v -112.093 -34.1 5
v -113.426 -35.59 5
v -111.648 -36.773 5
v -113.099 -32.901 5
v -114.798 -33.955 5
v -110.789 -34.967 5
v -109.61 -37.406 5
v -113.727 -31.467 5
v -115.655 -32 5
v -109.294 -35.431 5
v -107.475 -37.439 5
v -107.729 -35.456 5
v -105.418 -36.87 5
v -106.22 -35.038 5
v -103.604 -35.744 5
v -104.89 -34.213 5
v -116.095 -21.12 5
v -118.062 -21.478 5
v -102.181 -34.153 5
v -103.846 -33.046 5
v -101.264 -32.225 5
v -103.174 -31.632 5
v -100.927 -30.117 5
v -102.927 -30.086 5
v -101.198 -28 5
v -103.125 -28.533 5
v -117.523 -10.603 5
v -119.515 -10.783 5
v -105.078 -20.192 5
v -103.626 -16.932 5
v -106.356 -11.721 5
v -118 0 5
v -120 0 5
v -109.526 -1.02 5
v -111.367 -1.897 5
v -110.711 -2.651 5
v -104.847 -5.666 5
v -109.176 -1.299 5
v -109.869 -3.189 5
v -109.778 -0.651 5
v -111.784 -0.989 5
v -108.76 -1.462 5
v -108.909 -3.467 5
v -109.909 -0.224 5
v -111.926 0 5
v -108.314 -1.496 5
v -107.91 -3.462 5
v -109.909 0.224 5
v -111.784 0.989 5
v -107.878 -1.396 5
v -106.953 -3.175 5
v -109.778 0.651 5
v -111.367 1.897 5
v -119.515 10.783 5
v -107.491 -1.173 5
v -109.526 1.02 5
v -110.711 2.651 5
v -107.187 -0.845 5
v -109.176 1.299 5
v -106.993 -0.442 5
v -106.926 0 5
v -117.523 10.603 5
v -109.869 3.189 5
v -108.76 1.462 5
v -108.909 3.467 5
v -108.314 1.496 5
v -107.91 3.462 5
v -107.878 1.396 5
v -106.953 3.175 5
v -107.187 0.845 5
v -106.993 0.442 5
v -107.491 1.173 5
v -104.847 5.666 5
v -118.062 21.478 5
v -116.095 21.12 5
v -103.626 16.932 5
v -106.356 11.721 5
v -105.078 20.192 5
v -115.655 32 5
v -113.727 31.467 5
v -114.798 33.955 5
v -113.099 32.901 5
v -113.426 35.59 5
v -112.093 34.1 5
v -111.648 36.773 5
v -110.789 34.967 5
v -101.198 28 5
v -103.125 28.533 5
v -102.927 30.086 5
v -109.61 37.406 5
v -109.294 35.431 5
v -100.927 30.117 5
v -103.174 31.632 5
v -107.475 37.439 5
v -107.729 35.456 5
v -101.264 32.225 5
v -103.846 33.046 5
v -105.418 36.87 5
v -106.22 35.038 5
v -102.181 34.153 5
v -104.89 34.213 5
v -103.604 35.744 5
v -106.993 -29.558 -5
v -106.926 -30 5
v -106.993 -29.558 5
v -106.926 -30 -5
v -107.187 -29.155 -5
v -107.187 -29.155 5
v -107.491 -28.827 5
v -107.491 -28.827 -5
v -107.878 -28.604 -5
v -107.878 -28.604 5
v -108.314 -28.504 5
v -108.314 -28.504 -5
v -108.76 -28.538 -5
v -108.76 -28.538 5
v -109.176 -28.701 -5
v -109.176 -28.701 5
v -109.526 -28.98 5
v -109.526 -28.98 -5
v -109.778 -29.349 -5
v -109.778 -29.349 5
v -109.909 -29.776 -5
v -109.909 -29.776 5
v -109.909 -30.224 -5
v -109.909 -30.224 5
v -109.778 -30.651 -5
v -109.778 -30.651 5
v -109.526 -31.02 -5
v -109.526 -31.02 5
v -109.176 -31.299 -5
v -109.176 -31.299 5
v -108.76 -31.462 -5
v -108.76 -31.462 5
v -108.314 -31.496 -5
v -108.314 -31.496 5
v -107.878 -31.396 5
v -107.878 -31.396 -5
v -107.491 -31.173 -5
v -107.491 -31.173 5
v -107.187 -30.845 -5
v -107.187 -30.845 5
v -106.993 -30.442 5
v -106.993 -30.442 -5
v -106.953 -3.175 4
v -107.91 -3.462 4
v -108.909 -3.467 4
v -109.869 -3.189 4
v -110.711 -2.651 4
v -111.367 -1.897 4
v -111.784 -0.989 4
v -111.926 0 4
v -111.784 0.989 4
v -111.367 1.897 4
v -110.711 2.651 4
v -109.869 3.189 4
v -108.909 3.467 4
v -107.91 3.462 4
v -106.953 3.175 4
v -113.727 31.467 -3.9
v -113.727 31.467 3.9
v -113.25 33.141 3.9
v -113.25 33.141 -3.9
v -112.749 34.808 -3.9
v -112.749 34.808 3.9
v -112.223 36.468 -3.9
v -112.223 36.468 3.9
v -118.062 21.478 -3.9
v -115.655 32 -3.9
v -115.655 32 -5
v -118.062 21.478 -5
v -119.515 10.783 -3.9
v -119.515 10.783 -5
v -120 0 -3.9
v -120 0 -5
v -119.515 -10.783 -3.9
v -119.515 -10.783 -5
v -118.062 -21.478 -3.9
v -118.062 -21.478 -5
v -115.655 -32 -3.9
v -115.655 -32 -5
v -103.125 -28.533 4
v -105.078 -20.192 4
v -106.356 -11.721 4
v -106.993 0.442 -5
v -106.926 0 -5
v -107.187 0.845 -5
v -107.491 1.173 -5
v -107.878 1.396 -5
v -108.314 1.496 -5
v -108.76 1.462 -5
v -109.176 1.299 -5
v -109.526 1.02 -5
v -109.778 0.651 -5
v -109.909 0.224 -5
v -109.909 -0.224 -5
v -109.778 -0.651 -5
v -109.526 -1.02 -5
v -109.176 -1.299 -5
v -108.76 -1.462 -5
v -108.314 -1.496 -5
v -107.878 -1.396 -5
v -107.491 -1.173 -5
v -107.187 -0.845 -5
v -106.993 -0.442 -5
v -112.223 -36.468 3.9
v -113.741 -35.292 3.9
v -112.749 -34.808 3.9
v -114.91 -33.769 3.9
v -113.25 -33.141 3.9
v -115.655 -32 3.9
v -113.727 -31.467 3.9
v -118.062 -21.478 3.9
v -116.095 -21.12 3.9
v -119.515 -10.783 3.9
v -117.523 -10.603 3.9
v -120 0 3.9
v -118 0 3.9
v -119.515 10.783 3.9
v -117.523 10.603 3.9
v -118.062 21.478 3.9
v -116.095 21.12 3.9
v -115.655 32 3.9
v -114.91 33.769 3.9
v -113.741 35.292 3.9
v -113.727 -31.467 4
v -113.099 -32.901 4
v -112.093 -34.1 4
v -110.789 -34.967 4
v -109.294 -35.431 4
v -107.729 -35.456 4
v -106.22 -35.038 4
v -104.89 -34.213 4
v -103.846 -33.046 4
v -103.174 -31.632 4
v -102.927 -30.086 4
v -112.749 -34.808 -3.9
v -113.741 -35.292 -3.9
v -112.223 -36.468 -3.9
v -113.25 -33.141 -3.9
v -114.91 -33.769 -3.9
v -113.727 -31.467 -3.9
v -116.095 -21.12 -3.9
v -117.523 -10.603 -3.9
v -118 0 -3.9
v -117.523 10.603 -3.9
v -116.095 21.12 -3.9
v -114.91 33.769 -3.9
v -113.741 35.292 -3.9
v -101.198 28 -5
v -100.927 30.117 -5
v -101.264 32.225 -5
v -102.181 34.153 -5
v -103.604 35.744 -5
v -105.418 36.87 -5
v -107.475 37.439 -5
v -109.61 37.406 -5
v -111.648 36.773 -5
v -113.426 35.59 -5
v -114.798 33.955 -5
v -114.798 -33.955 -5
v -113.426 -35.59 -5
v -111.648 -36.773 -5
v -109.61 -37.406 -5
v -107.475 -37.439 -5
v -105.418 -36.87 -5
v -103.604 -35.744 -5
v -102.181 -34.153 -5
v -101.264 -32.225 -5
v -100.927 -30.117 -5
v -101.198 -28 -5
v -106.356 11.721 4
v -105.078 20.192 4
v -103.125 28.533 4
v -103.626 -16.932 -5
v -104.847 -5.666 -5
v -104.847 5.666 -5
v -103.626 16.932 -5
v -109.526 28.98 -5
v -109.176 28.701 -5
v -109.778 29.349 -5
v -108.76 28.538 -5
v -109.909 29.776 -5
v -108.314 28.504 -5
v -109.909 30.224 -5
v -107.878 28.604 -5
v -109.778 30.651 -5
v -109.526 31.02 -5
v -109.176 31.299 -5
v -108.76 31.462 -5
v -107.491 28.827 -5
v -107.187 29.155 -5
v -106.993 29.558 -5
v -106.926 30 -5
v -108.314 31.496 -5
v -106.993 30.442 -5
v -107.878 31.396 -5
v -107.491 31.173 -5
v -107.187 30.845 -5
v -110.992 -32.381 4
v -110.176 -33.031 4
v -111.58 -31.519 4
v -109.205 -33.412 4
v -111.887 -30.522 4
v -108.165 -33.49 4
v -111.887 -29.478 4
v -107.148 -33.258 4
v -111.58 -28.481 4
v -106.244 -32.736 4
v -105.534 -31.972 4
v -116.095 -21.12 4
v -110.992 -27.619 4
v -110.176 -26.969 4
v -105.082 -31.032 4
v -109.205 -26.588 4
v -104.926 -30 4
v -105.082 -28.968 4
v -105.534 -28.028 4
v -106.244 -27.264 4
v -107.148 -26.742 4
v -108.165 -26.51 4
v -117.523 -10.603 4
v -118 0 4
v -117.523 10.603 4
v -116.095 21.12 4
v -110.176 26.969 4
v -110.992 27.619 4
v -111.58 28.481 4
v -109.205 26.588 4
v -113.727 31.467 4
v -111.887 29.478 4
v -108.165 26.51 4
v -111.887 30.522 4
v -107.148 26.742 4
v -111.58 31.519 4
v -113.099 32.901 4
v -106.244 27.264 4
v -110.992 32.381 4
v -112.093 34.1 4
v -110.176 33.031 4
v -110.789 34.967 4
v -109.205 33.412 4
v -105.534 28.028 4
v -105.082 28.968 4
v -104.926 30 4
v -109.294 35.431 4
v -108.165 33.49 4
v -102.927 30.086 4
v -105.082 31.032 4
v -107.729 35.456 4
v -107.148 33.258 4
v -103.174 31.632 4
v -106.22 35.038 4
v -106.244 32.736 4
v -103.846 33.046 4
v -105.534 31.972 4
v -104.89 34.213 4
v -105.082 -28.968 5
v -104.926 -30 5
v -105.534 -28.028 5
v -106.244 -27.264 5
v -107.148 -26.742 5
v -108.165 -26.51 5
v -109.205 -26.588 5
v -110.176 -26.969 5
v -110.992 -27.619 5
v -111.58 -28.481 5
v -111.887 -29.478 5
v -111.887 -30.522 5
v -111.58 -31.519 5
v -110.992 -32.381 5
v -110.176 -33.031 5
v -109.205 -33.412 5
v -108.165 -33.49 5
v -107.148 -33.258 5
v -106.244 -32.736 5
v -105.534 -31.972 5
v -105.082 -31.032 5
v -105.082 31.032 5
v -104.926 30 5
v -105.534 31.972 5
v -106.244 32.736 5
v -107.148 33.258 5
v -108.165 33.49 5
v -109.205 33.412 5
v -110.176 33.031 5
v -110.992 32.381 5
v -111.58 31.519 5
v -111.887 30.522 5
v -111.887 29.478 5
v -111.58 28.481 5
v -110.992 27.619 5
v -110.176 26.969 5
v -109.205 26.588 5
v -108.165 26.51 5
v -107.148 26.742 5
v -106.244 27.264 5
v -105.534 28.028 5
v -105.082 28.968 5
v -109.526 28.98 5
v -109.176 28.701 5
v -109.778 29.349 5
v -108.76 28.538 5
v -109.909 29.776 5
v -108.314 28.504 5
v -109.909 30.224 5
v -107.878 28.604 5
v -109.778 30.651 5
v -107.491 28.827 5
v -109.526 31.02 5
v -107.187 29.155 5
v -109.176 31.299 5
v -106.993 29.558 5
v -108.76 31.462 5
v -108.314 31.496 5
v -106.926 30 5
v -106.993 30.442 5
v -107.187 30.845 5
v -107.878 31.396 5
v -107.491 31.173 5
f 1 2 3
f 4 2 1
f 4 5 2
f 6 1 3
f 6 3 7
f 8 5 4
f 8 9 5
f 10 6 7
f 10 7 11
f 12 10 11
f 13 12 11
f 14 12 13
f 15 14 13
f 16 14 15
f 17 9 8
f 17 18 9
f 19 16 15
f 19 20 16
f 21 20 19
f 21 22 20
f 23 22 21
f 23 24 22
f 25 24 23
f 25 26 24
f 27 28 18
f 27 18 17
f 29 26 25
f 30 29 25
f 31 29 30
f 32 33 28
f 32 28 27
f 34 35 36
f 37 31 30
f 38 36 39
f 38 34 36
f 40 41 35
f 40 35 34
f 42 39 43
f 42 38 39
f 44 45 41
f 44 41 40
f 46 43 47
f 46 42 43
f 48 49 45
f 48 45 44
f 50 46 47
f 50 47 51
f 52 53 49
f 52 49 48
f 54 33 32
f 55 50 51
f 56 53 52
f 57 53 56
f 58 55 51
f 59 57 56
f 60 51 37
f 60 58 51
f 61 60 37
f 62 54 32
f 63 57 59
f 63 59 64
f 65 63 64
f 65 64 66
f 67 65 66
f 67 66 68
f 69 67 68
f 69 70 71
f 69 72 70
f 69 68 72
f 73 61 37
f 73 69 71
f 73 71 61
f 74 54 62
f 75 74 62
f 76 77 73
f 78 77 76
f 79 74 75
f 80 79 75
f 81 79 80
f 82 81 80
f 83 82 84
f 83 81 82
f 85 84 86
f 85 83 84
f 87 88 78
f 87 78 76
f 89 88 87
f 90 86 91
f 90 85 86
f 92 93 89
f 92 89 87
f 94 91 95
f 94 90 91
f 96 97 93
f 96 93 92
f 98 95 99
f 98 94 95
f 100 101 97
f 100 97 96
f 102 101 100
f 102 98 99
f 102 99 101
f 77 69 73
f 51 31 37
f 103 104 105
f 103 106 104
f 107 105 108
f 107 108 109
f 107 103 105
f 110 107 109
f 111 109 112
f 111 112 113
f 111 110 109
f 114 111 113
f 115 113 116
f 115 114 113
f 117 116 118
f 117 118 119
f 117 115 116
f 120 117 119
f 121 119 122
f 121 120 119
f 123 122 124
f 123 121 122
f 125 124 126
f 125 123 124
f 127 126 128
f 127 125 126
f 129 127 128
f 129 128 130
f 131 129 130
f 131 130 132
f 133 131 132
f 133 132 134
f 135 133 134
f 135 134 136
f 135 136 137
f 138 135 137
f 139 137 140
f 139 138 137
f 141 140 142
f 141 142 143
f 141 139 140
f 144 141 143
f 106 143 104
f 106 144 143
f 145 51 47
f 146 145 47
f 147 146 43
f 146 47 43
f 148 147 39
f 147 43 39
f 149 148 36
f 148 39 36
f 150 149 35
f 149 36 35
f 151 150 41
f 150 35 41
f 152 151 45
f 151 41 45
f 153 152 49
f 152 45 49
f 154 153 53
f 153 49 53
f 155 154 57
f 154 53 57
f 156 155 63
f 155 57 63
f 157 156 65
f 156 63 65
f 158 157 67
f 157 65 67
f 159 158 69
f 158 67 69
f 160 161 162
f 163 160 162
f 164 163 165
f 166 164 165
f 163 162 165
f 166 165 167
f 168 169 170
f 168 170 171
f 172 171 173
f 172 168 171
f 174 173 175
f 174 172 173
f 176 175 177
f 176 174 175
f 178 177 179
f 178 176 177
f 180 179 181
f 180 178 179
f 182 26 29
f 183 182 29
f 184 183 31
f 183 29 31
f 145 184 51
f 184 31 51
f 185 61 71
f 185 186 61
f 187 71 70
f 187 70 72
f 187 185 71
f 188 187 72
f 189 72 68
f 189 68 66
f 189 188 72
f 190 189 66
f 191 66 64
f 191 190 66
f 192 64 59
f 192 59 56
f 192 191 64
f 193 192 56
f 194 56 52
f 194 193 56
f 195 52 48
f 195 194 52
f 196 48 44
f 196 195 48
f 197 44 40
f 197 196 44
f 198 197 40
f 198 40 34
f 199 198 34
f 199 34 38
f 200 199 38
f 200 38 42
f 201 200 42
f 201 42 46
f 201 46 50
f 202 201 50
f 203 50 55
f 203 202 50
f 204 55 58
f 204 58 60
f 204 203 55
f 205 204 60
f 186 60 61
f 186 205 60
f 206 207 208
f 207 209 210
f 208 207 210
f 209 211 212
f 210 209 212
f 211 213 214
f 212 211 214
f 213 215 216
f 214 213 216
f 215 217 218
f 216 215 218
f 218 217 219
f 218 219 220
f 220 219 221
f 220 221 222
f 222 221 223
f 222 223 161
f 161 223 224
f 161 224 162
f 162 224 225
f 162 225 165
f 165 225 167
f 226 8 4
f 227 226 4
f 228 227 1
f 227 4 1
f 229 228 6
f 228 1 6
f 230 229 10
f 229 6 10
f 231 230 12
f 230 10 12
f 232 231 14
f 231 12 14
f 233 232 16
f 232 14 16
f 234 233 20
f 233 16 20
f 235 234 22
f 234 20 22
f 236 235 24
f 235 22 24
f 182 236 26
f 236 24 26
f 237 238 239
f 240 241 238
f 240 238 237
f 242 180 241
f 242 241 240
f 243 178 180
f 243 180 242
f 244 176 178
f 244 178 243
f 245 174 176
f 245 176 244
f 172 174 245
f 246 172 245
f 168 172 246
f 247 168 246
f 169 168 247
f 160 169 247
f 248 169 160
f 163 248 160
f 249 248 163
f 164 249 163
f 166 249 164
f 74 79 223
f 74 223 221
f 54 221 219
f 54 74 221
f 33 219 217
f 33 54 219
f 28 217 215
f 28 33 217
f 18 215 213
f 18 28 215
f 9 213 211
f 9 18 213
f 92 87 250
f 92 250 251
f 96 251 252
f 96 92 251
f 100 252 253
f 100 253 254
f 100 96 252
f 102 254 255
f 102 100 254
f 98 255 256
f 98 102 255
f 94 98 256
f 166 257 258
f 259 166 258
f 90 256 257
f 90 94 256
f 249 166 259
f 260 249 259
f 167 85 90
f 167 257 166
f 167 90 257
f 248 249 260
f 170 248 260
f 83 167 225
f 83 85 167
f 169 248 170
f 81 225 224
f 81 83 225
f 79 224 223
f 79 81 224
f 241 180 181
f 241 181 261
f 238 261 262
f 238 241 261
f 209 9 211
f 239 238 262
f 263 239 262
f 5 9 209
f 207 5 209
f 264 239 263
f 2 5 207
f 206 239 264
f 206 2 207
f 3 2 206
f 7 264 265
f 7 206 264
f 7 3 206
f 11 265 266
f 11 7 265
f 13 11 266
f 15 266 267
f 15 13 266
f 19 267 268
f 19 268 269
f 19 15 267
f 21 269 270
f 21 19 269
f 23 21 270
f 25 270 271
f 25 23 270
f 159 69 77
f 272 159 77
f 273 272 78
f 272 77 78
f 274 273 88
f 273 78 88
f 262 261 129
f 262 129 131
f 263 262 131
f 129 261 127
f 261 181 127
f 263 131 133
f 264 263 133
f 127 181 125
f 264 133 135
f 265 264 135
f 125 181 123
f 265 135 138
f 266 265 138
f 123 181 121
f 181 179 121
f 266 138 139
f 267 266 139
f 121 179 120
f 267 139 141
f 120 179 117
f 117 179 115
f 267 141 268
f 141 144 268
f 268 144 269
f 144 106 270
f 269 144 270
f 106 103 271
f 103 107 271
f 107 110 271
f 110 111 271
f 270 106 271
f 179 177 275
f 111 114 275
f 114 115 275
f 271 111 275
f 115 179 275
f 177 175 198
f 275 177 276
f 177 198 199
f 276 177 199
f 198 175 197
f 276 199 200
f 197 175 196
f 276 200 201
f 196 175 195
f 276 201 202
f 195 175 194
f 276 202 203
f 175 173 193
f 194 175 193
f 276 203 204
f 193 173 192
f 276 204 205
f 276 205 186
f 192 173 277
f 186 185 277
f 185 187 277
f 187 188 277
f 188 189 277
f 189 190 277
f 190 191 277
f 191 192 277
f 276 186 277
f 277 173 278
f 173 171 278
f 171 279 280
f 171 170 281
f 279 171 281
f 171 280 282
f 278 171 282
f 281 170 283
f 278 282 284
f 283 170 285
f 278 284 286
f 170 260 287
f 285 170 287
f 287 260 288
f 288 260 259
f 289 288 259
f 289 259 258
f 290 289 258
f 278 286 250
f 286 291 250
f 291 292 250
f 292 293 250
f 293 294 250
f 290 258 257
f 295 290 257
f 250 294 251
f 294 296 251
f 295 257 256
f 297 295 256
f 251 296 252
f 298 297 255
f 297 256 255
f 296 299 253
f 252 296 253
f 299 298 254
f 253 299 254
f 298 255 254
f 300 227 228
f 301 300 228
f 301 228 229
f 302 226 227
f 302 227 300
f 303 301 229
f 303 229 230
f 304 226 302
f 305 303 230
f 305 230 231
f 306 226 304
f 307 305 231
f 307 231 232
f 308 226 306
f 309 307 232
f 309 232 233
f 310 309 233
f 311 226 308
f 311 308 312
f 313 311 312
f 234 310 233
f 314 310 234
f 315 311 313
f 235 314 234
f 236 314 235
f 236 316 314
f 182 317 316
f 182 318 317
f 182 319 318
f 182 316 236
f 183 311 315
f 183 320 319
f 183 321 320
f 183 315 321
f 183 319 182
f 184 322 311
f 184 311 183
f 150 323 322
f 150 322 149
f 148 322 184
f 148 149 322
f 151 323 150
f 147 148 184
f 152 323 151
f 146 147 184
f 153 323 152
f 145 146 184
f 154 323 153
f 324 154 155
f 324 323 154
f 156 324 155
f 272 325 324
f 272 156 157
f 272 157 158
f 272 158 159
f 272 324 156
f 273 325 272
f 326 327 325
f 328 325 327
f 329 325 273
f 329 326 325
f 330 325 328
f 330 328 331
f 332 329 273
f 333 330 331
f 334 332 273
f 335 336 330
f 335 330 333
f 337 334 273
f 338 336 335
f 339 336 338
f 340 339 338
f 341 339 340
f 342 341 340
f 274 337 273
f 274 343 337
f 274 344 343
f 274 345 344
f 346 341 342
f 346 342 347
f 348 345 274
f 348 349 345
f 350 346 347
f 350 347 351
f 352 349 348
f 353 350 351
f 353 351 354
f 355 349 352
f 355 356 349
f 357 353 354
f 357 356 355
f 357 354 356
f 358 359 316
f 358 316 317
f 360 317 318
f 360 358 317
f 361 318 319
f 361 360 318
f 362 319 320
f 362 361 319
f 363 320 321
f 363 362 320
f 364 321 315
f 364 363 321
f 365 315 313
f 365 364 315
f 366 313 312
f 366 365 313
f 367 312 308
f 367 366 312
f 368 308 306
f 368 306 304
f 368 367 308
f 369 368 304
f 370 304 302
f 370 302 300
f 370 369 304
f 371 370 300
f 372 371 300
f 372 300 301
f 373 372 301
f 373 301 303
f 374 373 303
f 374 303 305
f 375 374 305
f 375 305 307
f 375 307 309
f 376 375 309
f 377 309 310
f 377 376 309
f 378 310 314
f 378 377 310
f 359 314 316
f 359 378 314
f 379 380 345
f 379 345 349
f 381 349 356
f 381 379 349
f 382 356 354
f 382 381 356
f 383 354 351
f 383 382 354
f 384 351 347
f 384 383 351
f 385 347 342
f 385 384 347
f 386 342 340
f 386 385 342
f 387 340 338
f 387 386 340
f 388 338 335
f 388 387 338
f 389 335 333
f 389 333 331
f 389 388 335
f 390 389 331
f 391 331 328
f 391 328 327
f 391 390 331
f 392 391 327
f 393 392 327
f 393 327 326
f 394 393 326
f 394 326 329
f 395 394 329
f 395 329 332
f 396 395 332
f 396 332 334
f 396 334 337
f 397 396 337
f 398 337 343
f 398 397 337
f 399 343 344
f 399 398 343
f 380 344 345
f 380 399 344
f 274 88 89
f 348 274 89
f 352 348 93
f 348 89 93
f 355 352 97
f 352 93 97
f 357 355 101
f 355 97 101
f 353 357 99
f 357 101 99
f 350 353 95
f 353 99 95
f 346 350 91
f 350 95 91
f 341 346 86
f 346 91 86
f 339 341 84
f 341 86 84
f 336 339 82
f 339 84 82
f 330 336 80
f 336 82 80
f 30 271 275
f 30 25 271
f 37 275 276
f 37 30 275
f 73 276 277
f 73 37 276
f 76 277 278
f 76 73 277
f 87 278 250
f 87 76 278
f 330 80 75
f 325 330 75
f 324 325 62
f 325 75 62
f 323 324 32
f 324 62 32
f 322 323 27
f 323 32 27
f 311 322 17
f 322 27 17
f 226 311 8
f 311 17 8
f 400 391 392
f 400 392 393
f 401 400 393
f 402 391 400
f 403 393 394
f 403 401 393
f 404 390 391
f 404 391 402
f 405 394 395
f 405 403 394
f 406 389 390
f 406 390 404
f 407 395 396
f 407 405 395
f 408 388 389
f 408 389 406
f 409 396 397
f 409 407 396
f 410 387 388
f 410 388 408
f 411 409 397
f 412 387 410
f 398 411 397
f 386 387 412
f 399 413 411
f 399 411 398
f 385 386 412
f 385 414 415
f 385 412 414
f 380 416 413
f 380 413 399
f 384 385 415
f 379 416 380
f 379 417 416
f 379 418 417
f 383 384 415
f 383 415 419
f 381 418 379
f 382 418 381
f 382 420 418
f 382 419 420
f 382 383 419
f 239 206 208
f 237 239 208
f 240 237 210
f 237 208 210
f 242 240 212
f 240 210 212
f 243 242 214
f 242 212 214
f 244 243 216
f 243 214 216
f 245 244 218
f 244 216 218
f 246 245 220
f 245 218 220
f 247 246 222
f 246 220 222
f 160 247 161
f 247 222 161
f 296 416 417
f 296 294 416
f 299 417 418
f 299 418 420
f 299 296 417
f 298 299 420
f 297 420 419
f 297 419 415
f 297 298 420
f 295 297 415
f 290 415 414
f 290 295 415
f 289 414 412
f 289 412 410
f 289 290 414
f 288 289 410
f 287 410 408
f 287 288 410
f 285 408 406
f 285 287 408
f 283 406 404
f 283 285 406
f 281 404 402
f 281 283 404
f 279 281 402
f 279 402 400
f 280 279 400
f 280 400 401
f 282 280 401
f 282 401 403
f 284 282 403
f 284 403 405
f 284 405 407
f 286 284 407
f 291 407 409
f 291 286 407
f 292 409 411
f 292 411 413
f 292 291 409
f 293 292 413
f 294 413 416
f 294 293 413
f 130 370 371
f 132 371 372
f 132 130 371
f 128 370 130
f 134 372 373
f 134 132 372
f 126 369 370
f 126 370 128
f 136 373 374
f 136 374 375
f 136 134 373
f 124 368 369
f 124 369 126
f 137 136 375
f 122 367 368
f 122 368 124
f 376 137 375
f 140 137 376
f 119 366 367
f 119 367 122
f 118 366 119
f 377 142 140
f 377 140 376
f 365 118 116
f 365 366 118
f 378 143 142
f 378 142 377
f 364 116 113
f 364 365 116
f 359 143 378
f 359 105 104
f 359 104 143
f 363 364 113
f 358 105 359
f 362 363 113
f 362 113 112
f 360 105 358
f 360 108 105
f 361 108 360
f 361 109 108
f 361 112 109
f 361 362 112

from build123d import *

# Parameters (mm, degrees)
SKETCH1_R           = 1.5
BOSS_EXTRUDE1_DEPTH = 5
SKETCH2_R           = 3.5
CUT_EXTRUDE1_DEPTH  = 1
CUT_EXTRUDE2_DEPTH  = 3.9


with BuildPart() as part:
    # Sketch1 → Boss-Extrude1 (new, symmetric)
    with BuildSketch(Plane.XY):
        with BuildLine():
            ThreePointArc((-101.197826064, -28), (-105, 0), (-101.197826064, 28))
            ThreePointArc((-101.197826064, 28), (-106.426242211, 37.228416147), (-115.654658358, 32))
            ThreePointArc((-115.654658358, 32), (-120, 0), (-115.654658358, -32))
            ThreePointArc((-115.654658358, -32), (-106.426242211, -37.228416147), (-101.197826064, -28))
        make_face()
        with Locations((-108.426242211, -30)):
            Circle(SKETCH1_R, mode=Mode.SUBTRACT)
        with Locations((-108.426242211, 0)):
            Circle(SKETCH1_R, mode=Mode.SUBTRACT)
        with Locations((-108.426242211, 30)):
            Circle(SKETCH1_R, mode=Mode.SUBTRACT)
    extrude(amount=BOSS_EXTRUDE1_DEPTH, both=True)

    # Sketch2 → Cut-Extrude1 (cut)
    with BuildSketch(Plane.XY.offset(5)):
        with BuildLine():
            ThreePointArc((-103.125403703, 28.533333333), (-106.959575544, 35.300838508), (-113.727080719, 31.466666667))
            ThreePointArc((-113.727080719, 31.466666667), (-118, 0), (-113.727080719, -31.466666667))
            ThreePointArc((-113.727080719, -31.466666667), (-106.959575544, -35.300838508), (-103.125403703, -28.533333333))
            ThreePointArc((-103.125403703, -28.533333333), (-105.801637311, -15.969143446), (-106.952890403, -3.174781008))
            ThreePointArc((-106.952890403, -3.174781008), (-111.926242211, 0), (-106.952890403, 3.174781008))
            ThreePointArc((-106.952890403, 3.174781008), (-105.801637311, 15.969143446), (-103.125403703, 28.533333333))
        make_face()
        with Locations((-108.426242211, -30)):
            Circle(SKETCH2_R, mode=Mode.SUBTRACT)
        with Locations((-108.426242211, 30)):
            Circle(SKETCH2_R, mode=Mode.SUBTRACT)
    extrude(amount=-CUT_EXTRUDE1_DEPTH, mode=Mode.SUBTRACT)

    # Sketch3 → Cut-Extrude2 (cut, symmetric)
    with BuildSketch(Plane.XY):
        with BuildLine():
            ThreePointArc((-113.727080719, 31.466666667), (-111.610121749, 38.303795152), (-109.082537558, 45))
            Line((-109.082537558, 45), (-139.082537558, 45))
            Line((-139.082537558, 45), (-139.082537558, -45))
            Line((-139.082537558, -45), (-109.082537558, -45))
            ThreePointArc((-109.082537558, -45), (-111.610121749, -38.303795152), (-113.727080719, -31.466666667))
            ThreePointArc((-113.727080719, -31.466666667), (-118, 0), (-113.727080719, 31.466666667))
        make_face()
    extrude(amount=CUT_EXTRUDE2_DEPTH, both=True, mode=Mode.SUBTRACT)


solid = part.part
